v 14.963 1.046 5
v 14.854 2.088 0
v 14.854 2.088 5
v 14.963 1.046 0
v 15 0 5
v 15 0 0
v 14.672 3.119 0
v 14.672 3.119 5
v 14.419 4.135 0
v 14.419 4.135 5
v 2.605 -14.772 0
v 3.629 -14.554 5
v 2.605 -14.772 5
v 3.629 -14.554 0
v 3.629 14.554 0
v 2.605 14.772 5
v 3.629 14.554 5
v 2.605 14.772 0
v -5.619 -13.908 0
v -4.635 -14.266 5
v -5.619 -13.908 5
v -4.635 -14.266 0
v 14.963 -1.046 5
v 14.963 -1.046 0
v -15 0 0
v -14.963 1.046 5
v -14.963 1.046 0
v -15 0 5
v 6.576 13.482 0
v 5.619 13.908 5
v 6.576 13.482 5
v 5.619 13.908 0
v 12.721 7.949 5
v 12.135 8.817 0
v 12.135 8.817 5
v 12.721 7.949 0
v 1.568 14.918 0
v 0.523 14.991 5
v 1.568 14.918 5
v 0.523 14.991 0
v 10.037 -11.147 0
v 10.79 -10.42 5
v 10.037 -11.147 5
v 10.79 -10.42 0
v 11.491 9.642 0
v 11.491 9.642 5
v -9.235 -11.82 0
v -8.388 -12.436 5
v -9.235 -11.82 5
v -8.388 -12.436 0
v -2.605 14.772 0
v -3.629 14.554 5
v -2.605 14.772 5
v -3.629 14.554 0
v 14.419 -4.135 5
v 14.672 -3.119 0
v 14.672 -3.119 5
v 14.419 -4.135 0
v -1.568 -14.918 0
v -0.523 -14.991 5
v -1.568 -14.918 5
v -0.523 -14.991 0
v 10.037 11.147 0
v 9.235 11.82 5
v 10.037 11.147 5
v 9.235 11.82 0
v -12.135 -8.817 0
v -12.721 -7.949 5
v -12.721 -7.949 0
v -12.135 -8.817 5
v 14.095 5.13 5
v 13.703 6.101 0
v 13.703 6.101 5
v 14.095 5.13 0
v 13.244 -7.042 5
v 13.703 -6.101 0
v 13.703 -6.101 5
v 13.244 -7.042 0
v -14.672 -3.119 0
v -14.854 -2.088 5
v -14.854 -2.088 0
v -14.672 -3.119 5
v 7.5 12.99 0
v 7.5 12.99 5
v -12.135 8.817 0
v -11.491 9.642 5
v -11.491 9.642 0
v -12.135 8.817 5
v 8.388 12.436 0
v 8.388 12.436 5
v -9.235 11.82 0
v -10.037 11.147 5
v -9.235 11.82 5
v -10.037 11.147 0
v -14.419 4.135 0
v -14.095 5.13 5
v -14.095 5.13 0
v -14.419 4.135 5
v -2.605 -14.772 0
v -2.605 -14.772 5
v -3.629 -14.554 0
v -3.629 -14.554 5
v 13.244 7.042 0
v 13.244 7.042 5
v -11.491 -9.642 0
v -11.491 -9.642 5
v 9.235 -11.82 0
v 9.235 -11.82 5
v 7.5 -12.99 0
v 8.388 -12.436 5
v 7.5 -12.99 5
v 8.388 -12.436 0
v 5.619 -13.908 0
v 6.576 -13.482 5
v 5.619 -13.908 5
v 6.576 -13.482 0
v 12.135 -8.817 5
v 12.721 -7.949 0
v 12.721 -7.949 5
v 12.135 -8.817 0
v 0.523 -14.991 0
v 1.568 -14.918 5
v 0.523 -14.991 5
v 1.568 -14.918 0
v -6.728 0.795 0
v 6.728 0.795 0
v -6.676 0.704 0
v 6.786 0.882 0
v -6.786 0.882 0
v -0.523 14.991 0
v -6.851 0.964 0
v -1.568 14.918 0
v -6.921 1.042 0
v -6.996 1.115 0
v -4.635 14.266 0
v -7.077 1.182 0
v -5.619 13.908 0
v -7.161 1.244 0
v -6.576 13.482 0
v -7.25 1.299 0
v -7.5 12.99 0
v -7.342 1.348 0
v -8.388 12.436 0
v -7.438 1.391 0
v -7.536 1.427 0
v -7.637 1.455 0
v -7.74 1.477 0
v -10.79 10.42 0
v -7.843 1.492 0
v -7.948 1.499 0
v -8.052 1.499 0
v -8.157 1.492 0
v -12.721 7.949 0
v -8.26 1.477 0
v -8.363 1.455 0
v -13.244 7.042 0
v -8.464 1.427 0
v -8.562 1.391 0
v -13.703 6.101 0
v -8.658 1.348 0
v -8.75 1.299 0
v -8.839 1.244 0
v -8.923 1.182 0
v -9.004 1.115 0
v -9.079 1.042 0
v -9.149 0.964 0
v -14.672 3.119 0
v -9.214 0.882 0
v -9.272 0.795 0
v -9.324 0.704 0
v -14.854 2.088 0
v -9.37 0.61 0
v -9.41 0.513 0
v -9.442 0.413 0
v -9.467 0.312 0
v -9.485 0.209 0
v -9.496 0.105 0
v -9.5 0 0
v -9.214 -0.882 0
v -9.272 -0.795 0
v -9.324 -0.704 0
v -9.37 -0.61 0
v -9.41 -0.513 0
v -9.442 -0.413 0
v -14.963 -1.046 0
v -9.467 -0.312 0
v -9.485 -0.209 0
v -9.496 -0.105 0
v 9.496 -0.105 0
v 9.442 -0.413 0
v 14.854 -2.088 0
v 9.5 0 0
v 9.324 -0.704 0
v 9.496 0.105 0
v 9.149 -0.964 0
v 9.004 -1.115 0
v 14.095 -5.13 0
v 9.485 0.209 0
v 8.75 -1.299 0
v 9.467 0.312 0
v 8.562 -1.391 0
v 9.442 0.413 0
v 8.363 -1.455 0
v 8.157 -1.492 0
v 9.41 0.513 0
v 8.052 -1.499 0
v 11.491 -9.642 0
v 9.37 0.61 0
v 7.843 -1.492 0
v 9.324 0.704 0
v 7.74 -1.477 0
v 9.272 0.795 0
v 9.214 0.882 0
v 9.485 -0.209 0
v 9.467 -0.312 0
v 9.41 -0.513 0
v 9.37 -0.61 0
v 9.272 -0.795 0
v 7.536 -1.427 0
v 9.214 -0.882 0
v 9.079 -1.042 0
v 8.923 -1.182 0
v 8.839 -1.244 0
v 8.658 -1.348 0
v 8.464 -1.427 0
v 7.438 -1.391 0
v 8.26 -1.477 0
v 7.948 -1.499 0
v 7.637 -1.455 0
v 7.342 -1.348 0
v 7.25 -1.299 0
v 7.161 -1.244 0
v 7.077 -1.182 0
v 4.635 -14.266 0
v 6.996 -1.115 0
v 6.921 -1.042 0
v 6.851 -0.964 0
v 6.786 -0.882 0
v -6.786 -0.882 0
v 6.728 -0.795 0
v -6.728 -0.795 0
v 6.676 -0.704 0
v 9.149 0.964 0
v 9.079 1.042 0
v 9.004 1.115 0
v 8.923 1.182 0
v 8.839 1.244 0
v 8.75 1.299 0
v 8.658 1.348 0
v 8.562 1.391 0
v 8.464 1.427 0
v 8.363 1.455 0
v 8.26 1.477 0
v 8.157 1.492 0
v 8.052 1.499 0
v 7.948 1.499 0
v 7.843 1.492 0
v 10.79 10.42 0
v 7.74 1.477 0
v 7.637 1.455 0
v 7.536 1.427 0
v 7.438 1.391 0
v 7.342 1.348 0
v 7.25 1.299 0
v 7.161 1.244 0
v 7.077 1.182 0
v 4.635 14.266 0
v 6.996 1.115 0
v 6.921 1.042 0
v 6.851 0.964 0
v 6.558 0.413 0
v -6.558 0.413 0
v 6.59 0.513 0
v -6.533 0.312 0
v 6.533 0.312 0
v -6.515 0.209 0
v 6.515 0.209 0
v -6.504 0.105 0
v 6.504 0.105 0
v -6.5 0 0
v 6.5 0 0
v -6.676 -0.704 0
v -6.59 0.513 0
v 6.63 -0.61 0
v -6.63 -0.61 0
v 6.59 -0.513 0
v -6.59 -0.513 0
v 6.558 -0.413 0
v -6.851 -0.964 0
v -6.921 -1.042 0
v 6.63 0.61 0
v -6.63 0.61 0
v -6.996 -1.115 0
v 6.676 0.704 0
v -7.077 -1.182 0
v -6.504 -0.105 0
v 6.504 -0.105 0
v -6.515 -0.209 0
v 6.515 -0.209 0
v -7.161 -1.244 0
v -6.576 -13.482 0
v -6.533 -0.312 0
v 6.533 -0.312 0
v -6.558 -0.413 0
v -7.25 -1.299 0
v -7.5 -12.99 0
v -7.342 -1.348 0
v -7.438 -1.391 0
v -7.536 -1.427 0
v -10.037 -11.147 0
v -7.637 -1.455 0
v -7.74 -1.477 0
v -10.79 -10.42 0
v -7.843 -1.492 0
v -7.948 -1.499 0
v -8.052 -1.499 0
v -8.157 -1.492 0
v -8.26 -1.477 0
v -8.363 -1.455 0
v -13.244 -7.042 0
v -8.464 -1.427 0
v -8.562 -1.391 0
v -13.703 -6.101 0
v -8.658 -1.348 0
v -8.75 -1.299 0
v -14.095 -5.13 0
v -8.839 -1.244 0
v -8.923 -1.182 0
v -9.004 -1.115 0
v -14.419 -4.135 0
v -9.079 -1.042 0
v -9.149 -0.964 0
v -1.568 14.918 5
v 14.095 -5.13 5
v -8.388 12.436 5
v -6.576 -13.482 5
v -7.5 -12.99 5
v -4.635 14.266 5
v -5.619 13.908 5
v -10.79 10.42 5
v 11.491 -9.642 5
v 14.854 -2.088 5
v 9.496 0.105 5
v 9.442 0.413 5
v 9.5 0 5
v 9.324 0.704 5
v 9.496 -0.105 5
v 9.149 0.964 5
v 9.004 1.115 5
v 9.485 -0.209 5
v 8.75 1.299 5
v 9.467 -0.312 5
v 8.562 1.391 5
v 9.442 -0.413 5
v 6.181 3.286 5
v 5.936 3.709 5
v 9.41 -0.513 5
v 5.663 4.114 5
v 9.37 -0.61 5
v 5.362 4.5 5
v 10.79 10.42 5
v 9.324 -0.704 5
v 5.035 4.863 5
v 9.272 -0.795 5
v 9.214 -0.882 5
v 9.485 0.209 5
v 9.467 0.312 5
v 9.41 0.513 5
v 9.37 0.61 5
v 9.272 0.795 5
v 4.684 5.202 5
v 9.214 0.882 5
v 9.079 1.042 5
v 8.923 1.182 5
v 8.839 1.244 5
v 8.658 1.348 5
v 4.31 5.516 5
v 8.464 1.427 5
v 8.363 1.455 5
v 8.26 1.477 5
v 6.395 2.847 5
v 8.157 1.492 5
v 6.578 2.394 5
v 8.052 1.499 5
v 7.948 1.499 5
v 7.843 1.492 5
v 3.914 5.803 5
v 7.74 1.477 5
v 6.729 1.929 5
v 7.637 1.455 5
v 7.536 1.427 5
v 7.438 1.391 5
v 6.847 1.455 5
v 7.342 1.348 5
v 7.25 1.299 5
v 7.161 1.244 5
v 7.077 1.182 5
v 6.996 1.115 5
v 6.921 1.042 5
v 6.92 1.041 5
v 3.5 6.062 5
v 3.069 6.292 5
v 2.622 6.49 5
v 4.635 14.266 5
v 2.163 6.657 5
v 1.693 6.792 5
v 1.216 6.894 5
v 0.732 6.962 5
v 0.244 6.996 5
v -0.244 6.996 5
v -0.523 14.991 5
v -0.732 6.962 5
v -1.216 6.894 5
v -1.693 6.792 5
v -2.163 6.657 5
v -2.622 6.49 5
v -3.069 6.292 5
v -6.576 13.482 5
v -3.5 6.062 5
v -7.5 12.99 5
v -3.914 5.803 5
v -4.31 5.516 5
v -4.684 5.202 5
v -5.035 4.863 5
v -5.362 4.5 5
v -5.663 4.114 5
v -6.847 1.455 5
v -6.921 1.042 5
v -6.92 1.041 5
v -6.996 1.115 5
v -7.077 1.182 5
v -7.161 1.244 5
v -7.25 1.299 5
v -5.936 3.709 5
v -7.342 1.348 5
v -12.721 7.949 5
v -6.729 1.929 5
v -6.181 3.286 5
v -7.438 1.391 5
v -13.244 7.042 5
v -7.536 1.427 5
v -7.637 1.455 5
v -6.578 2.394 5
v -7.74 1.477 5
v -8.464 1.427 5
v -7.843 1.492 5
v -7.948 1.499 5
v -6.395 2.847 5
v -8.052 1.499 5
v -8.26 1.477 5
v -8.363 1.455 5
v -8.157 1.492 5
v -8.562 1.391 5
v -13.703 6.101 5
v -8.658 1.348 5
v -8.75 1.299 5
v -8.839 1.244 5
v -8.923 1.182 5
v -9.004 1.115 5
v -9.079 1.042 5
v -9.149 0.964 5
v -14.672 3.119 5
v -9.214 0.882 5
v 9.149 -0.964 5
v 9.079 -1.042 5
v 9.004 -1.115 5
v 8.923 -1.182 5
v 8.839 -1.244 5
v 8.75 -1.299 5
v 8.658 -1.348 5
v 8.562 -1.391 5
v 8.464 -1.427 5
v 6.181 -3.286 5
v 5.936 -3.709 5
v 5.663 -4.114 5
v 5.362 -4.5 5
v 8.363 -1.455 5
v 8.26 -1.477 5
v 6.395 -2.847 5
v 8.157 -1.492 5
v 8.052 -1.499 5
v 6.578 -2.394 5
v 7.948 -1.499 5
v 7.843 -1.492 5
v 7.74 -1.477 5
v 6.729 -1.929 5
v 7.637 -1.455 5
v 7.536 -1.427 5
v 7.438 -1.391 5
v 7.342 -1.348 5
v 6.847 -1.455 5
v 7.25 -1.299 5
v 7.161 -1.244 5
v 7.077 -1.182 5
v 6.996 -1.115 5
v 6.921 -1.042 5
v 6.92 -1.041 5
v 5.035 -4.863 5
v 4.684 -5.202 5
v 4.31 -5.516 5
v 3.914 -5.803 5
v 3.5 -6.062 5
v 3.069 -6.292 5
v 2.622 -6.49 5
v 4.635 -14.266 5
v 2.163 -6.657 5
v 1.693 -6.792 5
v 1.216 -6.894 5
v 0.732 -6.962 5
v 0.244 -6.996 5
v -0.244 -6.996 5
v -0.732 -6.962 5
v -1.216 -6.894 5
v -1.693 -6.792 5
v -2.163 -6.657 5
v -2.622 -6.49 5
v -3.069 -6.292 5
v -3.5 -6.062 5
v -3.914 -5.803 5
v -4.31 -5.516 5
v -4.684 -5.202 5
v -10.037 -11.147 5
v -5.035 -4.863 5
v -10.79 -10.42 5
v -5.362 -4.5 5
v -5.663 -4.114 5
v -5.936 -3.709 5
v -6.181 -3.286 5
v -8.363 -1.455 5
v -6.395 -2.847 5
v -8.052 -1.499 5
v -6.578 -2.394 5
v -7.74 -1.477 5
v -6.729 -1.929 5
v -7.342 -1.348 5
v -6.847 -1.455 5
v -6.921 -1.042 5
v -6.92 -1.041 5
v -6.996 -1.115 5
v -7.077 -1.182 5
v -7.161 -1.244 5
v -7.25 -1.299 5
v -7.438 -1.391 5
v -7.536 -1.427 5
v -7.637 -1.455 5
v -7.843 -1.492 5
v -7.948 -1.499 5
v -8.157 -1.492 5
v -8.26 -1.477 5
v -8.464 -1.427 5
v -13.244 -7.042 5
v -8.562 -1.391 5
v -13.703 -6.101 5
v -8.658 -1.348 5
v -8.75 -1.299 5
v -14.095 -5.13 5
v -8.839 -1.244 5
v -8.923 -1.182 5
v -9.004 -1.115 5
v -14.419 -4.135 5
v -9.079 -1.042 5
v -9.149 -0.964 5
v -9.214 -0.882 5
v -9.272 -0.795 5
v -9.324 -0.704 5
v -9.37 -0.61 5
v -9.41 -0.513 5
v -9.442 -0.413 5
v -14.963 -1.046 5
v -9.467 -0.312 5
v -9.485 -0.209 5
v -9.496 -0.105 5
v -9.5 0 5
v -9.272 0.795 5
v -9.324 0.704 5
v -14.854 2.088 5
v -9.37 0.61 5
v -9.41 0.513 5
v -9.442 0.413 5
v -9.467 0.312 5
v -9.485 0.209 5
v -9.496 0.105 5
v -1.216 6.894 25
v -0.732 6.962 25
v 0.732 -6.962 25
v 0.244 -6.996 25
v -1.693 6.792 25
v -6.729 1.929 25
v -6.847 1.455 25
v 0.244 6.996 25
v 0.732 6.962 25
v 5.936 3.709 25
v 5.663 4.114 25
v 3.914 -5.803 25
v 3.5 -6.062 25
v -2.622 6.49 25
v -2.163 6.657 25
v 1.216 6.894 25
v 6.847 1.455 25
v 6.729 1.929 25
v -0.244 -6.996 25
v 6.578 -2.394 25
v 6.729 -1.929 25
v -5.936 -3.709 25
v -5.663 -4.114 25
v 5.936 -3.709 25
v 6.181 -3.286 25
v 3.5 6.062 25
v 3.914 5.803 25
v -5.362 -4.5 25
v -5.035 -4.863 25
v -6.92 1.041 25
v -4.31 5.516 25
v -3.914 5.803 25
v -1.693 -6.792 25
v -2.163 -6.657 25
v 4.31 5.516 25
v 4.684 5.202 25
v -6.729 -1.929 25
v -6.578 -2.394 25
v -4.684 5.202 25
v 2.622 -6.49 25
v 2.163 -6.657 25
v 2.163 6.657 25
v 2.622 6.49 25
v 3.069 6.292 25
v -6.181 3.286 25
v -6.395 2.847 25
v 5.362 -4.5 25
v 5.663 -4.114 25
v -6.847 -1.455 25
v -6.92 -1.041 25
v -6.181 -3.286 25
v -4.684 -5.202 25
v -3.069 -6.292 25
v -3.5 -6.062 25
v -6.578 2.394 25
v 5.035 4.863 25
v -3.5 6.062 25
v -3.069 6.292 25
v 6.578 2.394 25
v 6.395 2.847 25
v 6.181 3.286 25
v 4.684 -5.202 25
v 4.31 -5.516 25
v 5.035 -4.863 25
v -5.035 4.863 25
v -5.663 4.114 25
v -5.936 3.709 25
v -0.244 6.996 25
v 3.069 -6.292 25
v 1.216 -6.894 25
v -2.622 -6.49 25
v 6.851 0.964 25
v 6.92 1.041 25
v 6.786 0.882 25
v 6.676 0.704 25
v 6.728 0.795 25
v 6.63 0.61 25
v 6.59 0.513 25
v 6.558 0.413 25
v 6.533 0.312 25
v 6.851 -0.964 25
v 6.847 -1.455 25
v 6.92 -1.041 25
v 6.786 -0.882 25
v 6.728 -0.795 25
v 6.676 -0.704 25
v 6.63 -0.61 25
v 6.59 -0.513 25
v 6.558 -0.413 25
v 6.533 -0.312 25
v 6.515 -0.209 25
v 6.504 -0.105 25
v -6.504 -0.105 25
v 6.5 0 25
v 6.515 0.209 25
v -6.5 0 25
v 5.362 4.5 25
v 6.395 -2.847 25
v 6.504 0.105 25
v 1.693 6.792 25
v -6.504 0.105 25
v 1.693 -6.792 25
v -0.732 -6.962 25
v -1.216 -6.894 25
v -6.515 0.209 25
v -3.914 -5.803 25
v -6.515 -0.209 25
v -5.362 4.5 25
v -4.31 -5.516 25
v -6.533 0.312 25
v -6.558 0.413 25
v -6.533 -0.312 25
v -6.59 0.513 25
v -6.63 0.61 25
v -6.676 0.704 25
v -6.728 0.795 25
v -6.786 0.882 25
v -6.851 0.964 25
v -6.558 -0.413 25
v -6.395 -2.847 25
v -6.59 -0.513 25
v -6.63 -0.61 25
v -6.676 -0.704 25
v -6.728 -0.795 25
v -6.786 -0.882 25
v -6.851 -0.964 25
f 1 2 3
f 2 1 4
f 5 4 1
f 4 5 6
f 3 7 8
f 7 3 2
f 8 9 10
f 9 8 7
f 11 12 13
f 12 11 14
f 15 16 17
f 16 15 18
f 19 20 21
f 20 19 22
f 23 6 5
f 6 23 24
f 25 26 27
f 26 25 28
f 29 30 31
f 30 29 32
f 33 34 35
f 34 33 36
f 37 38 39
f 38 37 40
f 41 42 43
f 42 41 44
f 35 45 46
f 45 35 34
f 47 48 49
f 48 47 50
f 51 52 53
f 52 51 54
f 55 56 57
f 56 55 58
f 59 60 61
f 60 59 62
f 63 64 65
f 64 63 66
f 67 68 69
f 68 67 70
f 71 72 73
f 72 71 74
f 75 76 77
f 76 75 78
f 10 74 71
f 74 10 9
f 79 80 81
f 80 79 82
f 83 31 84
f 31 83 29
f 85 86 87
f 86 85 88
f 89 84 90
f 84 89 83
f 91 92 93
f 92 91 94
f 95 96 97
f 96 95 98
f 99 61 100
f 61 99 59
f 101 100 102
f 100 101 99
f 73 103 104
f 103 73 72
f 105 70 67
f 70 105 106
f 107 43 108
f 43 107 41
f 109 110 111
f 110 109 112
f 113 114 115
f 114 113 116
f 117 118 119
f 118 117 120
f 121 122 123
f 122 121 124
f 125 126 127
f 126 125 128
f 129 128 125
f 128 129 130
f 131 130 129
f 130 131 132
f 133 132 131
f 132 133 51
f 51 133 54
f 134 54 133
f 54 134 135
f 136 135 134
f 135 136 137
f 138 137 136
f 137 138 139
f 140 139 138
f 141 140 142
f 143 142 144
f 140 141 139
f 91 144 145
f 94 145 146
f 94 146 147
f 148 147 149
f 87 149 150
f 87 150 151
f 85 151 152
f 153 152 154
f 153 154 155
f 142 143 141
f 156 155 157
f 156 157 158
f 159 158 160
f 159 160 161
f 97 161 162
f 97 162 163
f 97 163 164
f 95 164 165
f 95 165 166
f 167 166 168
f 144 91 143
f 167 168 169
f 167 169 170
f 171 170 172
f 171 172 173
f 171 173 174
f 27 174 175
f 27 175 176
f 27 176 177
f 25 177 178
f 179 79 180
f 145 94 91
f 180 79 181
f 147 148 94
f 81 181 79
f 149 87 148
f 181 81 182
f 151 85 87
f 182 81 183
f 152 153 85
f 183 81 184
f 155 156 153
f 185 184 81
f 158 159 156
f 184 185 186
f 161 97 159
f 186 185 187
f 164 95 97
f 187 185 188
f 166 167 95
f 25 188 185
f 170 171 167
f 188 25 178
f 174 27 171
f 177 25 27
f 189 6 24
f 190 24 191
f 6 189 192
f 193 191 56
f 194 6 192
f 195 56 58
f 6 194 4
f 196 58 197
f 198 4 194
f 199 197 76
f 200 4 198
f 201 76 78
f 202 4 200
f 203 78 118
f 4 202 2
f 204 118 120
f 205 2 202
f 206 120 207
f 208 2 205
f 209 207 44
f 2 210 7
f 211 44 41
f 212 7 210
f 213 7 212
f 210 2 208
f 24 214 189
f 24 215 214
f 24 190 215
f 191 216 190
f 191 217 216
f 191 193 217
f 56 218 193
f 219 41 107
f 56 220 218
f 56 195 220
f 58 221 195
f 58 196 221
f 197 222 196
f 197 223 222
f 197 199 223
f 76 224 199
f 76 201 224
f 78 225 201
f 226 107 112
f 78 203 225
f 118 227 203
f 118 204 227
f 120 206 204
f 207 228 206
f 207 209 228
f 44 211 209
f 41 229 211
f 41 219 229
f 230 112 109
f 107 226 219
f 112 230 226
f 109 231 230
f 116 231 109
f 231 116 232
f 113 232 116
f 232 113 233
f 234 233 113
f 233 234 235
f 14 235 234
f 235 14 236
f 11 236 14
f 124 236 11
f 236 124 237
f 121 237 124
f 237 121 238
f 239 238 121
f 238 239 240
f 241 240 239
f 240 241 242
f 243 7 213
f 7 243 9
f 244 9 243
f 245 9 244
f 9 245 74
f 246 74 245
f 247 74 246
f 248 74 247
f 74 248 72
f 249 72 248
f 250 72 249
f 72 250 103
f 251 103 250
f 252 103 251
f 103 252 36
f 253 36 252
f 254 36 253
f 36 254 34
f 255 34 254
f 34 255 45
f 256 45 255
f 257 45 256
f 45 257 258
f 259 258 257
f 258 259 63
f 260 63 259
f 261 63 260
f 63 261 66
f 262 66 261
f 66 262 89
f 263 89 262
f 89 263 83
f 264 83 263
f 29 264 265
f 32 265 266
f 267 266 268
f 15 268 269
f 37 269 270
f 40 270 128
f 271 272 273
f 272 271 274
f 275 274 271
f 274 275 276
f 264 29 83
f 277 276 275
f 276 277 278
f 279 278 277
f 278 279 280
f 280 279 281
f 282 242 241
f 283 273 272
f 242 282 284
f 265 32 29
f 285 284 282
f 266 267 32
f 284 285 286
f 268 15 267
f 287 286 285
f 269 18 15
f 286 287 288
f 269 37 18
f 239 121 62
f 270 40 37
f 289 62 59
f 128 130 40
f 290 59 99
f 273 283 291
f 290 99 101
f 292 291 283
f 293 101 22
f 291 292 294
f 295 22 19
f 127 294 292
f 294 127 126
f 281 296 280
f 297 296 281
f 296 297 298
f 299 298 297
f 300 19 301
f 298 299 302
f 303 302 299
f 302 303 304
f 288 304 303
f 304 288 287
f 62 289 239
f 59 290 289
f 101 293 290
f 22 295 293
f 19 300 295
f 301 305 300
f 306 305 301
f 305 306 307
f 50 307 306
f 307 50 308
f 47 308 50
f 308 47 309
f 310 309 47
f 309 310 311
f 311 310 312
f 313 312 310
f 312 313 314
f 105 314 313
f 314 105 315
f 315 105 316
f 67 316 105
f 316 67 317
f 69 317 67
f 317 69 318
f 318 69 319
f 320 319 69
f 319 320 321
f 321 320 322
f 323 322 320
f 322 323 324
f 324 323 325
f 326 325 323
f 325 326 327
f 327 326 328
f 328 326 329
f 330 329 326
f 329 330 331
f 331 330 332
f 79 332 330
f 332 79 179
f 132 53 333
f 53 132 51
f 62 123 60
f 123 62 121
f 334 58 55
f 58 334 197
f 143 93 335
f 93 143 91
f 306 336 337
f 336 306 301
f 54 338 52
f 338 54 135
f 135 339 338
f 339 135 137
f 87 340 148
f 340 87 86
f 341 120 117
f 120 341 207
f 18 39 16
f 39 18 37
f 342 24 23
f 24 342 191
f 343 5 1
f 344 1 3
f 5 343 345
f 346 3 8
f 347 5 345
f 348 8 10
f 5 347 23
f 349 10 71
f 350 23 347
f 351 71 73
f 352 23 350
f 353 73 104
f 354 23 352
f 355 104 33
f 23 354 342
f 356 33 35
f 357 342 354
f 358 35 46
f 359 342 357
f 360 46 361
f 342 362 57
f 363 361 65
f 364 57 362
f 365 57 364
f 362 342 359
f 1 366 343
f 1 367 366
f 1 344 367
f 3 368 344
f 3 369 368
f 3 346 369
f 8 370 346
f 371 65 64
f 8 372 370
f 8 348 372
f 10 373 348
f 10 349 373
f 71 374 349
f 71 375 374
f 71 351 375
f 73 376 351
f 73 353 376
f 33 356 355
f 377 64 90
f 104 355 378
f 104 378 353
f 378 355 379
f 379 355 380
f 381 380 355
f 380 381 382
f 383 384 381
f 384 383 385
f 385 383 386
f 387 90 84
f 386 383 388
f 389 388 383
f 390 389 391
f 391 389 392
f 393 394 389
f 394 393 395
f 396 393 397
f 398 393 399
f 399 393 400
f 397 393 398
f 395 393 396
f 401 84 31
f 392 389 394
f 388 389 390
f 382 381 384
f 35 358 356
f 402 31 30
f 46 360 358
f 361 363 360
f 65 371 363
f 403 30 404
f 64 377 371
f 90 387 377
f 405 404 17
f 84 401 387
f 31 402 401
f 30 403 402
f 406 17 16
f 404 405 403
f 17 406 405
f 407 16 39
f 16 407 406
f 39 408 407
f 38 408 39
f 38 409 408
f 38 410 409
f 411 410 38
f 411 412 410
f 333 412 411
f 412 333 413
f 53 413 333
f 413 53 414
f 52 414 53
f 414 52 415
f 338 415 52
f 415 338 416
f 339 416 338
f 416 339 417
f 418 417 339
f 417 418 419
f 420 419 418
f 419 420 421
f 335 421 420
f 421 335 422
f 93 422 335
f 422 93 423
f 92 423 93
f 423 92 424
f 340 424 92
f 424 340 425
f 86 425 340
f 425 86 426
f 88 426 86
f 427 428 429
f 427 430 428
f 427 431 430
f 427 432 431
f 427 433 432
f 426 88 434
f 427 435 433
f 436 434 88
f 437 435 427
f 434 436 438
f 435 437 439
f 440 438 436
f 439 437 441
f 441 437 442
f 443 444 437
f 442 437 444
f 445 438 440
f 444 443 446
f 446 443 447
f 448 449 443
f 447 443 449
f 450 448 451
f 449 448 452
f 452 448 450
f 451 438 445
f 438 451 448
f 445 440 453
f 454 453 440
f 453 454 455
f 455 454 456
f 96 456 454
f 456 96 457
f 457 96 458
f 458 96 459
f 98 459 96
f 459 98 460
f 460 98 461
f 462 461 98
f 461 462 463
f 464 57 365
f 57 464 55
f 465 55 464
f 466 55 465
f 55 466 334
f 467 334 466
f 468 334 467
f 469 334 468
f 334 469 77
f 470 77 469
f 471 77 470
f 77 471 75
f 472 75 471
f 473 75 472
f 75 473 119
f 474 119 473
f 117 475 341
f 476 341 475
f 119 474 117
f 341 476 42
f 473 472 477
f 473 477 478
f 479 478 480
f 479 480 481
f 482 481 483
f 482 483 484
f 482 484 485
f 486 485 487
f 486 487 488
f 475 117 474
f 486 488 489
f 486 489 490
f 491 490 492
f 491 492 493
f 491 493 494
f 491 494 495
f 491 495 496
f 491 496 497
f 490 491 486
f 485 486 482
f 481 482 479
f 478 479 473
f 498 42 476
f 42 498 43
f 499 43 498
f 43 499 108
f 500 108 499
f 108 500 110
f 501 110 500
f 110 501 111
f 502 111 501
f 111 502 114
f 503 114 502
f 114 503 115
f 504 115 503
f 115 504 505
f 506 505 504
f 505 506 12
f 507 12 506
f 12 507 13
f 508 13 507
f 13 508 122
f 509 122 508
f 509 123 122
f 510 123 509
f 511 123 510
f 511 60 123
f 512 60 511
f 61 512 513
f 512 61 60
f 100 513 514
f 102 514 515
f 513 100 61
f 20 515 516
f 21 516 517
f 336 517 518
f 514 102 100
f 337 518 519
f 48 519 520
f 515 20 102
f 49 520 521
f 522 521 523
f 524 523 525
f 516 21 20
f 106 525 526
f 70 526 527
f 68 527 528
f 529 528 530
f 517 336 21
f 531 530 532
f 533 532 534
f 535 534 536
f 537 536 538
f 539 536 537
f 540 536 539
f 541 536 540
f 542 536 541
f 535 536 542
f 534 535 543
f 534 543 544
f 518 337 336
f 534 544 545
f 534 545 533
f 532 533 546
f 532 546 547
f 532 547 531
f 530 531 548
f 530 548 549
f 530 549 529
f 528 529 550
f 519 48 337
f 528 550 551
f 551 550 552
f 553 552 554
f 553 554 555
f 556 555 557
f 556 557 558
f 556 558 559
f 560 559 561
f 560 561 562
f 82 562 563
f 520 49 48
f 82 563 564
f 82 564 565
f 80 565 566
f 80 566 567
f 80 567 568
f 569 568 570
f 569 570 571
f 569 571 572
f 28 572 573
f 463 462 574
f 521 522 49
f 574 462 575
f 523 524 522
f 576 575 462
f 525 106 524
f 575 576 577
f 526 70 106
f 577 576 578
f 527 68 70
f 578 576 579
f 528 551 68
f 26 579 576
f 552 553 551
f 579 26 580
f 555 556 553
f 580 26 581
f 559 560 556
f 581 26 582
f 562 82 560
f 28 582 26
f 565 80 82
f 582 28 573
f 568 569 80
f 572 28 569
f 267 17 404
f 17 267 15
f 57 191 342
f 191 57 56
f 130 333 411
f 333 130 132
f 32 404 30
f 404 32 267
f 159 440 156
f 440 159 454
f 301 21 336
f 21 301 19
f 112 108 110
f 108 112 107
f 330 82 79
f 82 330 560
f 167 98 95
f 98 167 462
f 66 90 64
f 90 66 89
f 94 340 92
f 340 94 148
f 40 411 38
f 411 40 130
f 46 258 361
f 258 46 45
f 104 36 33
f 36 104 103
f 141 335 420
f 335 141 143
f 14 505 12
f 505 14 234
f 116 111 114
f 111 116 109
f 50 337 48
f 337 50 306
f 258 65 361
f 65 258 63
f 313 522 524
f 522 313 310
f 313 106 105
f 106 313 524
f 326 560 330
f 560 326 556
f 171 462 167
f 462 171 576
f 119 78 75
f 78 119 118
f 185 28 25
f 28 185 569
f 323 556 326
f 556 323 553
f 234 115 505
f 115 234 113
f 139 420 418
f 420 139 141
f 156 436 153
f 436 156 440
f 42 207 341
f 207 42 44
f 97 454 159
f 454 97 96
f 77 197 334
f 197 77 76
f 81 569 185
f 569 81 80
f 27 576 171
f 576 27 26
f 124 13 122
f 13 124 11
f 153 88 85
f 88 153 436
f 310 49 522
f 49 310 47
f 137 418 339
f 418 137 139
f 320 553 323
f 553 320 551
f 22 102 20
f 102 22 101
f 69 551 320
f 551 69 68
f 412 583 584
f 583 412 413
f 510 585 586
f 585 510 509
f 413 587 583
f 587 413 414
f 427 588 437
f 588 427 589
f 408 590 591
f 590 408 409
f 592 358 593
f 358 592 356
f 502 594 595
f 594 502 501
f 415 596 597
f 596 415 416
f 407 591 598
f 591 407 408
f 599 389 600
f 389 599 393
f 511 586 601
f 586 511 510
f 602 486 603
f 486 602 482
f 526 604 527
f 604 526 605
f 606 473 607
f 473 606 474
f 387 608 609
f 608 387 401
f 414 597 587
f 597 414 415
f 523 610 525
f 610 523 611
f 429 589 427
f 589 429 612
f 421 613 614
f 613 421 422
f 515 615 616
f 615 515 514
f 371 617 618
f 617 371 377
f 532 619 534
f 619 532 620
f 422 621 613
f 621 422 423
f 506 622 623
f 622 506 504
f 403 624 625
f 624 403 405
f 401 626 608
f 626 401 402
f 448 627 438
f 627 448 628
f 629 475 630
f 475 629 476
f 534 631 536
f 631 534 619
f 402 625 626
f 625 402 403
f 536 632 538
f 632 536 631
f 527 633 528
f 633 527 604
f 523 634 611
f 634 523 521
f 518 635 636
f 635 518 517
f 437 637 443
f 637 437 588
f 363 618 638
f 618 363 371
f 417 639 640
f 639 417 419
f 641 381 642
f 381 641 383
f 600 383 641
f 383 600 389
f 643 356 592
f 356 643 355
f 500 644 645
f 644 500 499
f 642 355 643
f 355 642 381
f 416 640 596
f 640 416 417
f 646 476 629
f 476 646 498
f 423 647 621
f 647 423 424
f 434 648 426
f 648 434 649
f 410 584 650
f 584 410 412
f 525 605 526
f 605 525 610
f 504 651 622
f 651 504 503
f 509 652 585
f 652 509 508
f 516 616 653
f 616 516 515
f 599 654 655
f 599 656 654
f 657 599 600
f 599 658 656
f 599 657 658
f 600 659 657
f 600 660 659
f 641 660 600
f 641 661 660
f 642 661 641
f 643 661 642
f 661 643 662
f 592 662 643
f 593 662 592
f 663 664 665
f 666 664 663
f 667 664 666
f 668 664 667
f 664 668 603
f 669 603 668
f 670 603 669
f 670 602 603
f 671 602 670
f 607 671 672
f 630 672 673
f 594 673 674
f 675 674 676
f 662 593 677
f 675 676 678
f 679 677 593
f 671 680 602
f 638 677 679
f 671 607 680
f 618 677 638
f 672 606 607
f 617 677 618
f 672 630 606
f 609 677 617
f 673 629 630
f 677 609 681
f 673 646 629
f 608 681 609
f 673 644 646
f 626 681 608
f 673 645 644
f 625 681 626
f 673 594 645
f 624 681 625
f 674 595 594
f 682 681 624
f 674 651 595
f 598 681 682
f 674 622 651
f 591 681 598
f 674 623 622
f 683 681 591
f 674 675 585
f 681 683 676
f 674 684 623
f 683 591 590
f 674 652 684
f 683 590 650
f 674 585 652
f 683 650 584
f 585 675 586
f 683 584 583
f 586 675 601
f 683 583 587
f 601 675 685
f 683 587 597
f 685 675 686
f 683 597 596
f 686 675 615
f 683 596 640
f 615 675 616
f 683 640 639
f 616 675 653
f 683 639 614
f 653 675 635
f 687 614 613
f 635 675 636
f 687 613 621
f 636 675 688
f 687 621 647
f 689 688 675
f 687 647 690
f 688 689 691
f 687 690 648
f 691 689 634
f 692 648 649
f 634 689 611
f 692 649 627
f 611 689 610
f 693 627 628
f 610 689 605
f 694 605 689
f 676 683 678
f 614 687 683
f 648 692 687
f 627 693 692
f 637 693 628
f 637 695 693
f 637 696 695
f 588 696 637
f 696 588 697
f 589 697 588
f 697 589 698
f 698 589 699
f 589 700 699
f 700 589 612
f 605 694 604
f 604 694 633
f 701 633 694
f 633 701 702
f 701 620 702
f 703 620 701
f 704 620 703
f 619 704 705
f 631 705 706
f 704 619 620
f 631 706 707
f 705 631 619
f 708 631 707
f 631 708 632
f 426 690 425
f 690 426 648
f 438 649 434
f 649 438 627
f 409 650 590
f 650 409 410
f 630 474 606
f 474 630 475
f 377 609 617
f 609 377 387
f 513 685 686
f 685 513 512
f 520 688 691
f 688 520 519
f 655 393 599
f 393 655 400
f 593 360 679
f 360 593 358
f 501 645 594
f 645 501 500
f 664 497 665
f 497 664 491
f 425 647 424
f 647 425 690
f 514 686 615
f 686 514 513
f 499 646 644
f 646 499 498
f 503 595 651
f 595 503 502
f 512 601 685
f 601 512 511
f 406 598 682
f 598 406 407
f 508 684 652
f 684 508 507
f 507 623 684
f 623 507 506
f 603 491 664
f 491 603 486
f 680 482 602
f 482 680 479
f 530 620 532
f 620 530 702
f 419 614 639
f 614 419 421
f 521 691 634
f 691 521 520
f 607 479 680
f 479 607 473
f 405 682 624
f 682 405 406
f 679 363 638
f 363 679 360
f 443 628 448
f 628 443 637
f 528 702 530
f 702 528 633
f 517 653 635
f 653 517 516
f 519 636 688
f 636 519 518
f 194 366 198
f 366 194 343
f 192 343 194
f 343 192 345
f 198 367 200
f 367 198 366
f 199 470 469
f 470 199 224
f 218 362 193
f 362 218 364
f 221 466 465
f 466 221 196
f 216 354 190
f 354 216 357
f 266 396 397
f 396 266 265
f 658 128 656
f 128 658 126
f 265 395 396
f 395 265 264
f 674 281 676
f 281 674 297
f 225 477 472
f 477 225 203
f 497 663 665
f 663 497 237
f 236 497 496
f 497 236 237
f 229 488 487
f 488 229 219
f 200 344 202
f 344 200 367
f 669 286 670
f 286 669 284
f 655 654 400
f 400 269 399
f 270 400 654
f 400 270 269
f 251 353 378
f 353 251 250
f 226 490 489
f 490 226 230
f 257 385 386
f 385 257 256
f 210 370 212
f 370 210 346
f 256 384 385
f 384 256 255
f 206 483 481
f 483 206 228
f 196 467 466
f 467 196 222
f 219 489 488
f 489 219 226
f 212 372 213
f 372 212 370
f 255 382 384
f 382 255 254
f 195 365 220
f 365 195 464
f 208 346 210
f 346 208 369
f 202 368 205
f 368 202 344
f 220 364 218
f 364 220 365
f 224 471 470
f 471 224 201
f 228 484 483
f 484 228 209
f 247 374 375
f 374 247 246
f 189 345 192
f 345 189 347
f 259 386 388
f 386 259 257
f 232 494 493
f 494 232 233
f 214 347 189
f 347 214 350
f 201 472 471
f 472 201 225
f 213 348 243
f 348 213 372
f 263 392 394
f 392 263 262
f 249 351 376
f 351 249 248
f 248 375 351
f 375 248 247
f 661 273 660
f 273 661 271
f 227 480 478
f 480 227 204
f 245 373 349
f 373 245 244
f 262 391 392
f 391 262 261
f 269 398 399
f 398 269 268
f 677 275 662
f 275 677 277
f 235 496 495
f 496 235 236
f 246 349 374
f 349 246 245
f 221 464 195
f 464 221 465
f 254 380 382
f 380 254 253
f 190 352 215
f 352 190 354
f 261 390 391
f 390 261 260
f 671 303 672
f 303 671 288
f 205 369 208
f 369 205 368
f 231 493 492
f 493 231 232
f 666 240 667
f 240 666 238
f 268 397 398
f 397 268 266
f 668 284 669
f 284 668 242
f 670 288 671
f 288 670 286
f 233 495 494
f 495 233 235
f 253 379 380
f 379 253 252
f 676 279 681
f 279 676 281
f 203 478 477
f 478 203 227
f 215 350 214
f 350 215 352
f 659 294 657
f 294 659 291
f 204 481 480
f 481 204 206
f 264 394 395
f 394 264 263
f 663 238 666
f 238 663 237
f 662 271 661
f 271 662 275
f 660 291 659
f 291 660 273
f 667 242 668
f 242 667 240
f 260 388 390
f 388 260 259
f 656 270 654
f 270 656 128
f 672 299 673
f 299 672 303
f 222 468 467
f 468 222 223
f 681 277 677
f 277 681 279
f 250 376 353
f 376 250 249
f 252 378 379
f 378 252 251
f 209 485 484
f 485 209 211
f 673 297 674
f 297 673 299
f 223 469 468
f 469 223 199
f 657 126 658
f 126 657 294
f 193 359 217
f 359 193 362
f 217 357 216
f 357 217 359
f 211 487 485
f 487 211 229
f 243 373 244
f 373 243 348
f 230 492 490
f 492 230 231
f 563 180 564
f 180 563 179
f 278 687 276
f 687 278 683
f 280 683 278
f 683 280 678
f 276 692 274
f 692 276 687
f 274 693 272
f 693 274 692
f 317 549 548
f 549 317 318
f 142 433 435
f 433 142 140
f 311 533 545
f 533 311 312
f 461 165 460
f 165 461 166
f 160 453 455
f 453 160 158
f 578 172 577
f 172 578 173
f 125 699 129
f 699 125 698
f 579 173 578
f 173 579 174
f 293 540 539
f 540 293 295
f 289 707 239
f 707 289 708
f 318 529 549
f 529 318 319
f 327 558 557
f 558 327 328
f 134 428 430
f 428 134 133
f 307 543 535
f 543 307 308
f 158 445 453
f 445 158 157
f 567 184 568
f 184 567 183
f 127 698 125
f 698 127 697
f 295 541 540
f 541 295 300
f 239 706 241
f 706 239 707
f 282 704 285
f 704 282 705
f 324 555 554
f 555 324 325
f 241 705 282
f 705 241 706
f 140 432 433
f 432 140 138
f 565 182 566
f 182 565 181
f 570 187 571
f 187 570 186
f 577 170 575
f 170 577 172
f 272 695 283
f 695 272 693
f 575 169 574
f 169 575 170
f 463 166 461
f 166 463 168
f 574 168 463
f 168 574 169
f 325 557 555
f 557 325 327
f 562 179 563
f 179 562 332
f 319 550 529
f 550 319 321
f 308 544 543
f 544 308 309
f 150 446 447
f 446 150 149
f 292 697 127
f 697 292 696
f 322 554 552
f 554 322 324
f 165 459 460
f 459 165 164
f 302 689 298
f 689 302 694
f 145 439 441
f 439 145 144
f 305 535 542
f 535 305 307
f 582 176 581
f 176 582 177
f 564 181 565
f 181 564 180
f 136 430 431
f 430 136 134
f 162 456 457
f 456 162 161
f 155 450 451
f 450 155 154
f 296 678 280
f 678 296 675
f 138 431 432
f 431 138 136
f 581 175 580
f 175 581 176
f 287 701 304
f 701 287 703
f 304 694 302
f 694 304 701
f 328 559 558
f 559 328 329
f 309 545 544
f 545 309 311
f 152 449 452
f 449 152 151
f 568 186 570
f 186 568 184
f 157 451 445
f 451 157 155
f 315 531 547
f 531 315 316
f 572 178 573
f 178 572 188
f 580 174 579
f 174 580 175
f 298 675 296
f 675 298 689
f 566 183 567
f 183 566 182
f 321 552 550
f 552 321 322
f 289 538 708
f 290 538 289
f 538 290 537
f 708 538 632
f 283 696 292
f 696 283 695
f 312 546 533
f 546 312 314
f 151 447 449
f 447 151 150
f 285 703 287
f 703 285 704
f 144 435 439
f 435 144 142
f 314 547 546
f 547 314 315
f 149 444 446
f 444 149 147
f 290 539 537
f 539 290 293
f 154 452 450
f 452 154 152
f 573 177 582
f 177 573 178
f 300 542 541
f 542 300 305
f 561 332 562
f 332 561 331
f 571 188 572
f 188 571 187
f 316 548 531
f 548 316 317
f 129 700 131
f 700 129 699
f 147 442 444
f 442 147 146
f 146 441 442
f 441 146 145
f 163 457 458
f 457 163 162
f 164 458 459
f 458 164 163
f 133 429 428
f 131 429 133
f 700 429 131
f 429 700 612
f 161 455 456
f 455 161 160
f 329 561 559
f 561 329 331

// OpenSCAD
$fa=4; // default minimum facet angle is now 4
$fs=0.05; // default minimum facet size is now 0.05 mm

difference() {
  union() {
    cylinder(r = 15, h = 5);
    cylinder(r = 7, h = 25);
  }
  translate([8, 0, -1]) cylinder(r = 1.5, h = 100);
  translate([-8, 0, -1]) cylinder(r = 1.5, h = 100);
}
